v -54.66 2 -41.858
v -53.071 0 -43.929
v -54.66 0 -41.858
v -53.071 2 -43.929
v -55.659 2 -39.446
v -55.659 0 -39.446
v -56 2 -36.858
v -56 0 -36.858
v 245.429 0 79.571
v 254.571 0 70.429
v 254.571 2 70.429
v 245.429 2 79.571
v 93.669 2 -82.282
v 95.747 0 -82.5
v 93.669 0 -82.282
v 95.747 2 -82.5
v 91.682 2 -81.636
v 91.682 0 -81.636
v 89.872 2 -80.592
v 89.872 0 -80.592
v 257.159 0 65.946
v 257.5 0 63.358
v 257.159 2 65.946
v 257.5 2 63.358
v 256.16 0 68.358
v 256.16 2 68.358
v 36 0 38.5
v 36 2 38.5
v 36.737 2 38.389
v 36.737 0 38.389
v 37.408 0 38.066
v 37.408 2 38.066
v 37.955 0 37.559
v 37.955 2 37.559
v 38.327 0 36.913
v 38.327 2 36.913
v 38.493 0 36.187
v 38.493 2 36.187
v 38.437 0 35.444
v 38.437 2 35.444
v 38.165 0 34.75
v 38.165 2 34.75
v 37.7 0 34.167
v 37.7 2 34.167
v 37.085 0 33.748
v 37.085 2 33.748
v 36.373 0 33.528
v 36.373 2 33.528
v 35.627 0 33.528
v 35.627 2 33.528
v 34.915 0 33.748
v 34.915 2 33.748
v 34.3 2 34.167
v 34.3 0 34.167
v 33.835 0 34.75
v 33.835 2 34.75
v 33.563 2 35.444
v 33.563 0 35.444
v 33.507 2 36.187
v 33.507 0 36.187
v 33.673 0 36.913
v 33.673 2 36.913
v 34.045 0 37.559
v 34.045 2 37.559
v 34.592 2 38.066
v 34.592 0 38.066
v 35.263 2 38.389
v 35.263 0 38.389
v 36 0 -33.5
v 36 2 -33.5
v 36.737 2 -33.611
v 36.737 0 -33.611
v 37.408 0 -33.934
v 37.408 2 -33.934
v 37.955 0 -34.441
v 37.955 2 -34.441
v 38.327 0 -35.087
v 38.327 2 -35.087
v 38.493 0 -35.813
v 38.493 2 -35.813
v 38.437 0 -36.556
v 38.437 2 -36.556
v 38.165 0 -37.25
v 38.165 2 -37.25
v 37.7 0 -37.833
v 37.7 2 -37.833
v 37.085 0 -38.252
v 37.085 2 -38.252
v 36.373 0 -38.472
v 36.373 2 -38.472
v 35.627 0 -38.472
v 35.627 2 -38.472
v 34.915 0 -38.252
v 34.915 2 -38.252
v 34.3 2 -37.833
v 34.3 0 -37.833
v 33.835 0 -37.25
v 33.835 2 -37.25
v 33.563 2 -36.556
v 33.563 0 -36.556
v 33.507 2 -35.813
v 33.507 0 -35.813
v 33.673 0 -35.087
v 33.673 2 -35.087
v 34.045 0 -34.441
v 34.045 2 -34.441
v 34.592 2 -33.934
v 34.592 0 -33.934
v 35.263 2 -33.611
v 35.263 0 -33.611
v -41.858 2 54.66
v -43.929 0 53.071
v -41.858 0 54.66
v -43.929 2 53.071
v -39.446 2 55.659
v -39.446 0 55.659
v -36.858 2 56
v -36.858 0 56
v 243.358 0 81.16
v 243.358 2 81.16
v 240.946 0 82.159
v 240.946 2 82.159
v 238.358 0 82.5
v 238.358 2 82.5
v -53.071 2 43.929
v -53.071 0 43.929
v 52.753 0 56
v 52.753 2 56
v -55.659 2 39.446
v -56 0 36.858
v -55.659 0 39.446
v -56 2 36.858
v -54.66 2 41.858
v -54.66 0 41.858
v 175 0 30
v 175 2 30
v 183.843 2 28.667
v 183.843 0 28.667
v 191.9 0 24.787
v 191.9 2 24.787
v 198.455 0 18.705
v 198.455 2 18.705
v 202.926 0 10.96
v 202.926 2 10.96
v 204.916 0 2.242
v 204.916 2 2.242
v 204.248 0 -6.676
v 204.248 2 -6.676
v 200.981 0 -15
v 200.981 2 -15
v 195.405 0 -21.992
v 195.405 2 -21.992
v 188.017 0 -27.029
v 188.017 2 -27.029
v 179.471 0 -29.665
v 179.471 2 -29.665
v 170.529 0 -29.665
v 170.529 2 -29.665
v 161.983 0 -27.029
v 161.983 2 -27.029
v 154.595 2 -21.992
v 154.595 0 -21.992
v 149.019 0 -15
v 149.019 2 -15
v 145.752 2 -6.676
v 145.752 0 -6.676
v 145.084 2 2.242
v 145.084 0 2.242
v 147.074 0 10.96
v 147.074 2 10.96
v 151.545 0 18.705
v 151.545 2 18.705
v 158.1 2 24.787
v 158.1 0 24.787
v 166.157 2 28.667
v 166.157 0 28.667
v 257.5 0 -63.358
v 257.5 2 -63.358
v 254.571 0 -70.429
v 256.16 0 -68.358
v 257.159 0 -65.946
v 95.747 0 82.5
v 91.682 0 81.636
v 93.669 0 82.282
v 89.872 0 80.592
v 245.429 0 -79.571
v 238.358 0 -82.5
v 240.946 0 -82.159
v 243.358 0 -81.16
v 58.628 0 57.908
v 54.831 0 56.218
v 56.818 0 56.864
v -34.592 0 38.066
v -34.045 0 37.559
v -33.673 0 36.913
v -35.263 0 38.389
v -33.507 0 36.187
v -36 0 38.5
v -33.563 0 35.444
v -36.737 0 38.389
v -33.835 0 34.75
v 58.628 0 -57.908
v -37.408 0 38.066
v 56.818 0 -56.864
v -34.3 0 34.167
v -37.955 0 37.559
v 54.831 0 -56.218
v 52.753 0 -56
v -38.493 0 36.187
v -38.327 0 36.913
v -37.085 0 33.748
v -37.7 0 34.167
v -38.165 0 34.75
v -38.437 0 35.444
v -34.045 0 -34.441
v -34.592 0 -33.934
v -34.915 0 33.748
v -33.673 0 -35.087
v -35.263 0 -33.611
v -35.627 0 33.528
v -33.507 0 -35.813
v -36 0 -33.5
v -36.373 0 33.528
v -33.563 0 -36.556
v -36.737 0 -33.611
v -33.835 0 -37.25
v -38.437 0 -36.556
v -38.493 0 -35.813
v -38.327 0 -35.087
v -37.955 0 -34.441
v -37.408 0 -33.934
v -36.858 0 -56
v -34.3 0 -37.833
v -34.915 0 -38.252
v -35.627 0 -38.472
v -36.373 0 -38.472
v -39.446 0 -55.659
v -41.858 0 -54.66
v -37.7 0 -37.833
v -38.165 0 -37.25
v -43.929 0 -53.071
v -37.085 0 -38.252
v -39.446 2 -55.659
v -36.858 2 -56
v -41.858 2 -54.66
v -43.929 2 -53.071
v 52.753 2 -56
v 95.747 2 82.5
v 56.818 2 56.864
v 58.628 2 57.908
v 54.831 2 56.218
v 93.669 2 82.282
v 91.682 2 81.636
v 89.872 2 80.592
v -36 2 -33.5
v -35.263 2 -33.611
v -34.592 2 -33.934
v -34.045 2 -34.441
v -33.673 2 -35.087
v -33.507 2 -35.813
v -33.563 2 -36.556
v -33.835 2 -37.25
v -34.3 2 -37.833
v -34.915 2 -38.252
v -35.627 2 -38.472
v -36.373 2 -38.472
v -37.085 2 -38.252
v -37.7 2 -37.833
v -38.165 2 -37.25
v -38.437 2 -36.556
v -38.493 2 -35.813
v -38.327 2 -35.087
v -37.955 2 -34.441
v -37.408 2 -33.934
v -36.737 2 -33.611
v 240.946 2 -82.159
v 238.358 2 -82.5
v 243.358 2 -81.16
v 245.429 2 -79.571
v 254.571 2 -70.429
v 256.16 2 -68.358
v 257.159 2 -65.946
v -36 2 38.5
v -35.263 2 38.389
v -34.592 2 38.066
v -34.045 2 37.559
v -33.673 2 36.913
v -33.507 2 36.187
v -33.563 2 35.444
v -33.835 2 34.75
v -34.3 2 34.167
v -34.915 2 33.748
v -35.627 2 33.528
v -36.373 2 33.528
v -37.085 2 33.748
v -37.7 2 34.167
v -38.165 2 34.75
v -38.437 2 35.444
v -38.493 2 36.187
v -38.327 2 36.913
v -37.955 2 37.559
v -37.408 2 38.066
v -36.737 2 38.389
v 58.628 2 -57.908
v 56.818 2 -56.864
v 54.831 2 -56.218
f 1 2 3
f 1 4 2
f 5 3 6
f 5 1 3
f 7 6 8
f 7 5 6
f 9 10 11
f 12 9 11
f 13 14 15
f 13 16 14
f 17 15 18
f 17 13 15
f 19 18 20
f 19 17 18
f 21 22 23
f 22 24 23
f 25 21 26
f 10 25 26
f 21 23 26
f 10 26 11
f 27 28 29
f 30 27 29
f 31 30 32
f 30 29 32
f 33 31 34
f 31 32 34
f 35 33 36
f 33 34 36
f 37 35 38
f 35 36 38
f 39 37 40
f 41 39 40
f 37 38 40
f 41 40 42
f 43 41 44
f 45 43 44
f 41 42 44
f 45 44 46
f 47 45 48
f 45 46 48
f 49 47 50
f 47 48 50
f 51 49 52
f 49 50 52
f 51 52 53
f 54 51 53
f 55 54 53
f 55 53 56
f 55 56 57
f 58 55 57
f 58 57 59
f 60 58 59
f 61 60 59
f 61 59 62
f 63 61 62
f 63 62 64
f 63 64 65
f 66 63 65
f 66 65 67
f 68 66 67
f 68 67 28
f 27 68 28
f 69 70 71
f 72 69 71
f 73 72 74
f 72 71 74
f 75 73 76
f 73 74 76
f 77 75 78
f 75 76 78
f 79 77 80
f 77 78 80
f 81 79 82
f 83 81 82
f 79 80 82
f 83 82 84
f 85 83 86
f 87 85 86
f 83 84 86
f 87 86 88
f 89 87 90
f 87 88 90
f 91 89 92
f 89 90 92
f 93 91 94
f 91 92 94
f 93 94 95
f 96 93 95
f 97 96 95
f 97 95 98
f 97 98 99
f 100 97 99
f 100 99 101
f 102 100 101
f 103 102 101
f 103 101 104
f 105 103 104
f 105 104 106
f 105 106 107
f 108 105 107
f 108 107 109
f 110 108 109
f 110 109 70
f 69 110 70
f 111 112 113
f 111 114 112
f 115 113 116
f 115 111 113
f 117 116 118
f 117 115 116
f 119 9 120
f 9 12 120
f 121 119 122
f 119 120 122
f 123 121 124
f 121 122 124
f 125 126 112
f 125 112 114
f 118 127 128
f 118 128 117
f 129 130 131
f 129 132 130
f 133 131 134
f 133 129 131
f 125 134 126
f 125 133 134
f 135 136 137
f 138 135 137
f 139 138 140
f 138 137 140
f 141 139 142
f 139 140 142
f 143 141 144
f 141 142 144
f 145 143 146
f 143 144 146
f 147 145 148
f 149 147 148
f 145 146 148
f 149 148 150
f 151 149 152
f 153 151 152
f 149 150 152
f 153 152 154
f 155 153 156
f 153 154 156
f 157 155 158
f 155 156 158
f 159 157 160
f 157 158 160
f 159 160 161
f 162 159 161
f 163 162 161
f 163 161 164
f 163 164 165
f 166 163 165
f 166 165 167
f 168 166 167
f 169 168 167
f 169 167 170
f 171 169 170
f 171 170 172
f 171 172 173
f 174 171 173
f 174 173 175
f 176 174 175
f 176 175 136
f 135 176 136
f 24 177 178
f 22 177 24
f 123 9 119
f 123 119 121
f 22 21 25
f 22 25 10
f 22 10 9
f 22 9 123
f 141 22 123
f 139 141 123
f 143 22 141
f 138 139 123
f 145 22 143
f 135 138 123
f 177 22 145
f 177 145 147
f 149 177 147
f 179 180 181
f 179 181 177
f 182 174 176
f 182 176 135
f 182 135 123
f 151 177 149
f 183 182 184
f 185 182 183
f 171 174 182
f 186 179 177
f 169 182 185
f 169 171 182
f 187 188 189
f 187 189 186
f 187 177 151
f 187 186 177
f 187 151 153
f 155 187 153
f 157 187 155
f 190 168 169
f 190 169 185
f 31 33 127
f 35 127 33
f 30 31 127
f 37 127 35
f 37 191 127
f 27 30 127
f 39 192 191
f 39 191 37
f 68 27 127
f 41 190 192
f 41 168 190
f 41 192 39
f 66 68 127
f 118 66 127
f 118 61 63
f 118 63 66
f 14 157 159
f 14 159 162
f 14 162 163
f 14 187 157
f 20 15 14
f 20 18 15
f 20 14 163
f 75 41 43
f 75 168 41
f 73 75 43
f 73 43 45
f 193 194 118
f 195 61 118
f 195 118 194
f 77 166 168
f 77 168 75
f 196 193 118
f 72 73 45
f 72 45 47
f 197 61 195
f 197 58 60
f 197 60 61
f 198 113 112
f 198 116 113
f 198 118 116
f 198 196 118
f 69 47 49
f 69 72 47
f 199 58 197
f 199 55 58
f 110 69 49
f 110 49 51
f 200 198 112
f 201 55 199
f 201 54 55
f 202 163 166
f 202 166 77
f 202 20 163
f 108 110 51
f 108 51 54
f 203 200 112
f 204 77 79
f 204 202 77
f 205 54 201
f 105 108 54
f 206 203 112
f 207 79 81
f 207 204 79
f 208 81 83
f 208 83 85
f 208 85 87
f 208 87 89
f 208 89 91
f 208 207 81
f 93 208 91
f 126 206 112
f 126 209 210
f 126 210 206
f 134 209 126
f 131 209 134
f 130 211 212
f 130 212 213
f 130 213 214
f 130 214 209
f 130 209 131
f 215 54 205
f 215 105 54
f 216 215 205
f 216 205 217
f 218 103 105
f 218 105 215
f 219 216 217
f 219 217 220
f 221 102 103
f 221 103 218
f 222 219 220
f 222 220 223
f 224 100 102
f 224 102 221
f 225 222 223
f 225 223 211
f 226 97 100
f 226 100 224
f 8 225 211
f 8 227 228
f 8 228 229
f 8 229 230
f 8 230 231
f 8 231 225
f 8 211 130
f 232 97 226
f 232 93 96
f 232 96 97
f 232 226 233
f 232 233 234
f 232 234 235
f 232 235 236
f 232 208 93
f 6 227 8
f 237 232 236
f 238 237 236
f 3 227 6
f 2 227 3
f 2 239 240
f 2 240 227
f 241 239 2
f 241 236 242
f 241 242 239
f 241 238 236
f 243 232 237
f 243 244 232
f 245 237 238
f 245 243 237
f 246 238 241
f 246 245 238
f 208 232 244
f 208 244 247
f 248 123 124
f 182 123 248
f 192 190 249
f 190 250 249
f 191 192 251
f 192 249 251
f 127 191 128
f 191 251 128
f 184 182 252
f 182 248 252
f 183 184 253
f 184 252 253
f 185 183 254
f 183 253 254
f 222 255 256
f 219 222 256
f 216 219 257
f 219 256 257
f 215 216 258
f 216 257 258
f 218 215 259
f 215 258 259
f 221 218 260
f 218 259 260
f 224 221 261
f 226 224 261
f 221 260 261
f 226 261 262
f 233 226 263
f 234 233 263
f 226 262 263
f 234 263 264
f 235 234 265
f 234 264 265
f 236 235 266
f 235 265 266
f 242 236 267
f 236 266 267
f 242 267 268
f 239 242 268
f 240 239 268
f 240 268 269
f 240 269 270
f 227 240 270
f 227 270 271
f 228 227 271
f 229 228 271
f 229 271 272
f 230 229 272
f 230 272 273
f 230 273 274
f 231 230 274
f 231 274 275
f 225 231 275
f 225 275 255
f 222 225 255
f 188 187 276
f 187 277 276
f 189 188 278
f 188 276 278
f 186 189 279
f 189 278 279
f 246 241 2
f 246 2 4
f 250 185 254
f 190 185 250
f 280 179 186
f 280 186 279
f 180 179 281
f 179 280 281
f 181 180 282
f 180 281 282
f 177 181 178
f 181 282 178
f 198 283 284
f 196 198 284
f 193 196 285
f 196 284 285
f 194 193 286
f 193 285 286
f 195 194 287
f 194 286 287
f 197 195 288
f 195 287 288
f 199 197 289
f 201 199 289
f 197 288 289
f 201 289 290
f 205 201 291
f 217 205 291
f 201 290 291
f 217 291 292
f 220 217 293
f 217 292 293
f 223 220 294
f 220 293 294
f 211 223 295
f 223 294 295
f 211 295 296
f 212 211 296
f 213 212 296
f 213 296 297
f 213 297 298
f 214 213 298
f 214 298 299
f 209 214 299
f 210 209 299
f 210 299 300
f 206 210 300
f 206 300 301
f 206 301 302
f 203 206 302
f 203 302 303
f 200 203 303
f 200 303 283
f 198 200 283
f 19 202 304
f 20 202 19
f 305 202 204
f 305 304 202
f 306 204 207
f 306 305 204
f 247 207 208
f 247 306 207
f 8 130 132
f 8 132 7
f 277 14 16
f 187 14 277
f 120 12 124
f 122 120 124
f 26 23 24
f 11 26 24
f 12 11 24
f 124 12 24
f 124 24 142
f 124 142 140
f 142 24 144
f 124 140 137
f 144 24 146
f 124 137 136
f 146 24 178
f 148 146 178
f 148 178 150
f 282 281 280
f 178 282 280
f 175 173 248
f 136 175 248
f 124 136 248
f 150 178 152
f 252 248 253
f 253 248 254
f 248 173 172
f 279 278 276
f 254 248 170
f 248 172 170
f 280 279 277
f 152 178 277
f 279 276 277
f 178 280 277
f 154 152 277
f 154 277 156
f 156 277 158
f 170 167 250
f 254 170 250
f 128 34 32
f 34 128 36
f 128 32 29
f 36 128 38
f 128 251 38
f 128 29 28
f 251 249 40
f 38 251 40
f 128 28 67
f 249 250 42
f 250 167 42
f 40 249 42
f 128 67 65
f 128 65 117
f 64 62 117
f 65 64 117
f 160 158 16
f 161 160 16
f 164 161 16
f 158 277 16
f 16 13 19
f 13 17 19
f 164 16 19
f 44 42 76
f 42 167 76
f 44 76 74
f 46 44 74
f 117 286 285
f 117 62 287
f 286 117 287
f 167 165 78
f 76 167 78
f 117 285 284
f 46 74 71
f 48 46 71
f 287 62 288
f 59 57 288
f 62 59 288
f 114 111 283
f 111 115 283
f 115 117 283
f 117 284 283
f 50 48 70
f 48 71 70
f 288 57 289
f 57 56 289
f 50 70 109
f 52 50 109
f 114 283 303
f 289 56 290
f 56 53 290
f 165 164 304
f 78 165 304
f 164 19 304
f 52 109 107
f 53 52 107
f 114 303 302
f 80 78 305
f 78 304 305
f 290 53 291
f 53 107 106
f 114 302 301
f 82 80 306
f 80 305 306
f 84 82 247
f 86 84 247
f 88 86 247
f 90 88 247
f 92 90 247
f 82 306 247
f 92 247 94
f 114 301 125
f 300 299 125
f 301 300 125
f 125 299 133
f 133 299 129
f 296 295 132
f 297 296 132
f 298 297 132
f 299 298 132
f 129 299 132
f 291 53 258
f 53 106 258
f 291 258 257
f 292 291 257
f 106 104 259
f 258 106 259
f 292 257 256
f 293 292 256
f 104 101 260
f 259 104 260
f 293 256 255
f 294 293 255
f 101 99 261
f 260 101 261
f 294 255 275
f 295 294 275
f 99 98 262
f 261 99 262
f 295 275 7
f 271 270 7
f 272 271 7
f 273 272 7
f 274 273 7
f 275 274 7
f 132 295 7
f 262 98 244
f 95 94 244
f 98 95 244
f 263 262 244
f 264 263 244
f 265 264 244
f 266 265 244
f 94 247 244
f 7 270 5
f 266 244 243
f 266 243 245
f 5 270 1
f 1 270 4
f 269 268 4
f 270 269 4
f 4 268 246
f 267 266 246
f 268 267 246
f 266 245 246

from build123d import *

# Parameters (mm, degrees)
BOSS_EXTRUDE1_DEPTH = 2
CHAMFER1_SIZE       = 15
FILLET1_R           = 10
SKETCH3_R           = 2.5
SKETCH3_R_2         = 30
CUT_EXTRUDE1_DEPTH  = 271.400628697


with BuildPart() as part:
    # Sketch2 → Boss-Extrude1 (new body)
    with BuildSketch(Plane(origin=(0, 0, 0), x_dir=(1, 0, 0), z_dir=(0, 1, 0))):
        Polygon((56, 56), (92.5, 82.5), (257.5, 82.5), (257.5, -82.5), (92.5, -82.5), (56, -56), (-56, -56), (-56, 56), align=None)
    extrude(amount=BOSS_EXTRUDE1_DEPTH)

    # Chamfer1
    chamfer1_edges = [part.edges().sort_by_distance(p)[0] for p in [
        (257.5, 1, 82.5),
        (-56, 1, 56),
        (-56, 1, -56),
        (257.5, 1, -82.5),
    ]]
    chamfer(chamfer1_edges, length=CHAMFER1_SIZE)

    # Fillet1
    fillet1_edges = [part.edges().sort_by_distance(p)[0] for p in [
        (92.5, 1, 82.5),
        (56, 1, 56),
        (56, 1, -56),
        (92.5, 1, -82.5),
        (-56, 1, 41),
        (-56, 1, -41),
        (-41, 1, -56),
        (-41, 1, 56),
        (242.5, 1, -82.5),
        (257.5, 1, 67.5),
        (257.5, 1, -67.5),
        (242.5, 1, 82.5),
    ]]
    fillet(fillet1_edges, radius=FILLET1_R)

    # Sketch3 → Cut-Extrude1 (cut, through all)
    with BuildSketch(Plane(origin=(0, 2, 0), x_dir=(1, 0, 0), z_dir=(0, 1, 0))):
        with Locations(Location((36, 36, 0), (0, 0, 270))):
            Circle(SKETCH3_R)
        with Locations(Location((-36, 36, 0), (0, 0, 270))):
            Circle(SKETCH3_R)
        with Locations(Location((-36, -36, 0), (0, 0, 270))):
            Circle(SKETCH3_R)
        with Locations(Location((36, -36, 0), (0, 0, 270))):
            Circle(SKETCH3_R)
        with Locations(Location((175, 0, 0), (0, 0, 270))):
            Circle(SKETCH3_R_2)
    extrude(amount=-CUT_EXTRUDE1_DEPTH, mode=Mode.SUBTRACT)


solid = part.part
